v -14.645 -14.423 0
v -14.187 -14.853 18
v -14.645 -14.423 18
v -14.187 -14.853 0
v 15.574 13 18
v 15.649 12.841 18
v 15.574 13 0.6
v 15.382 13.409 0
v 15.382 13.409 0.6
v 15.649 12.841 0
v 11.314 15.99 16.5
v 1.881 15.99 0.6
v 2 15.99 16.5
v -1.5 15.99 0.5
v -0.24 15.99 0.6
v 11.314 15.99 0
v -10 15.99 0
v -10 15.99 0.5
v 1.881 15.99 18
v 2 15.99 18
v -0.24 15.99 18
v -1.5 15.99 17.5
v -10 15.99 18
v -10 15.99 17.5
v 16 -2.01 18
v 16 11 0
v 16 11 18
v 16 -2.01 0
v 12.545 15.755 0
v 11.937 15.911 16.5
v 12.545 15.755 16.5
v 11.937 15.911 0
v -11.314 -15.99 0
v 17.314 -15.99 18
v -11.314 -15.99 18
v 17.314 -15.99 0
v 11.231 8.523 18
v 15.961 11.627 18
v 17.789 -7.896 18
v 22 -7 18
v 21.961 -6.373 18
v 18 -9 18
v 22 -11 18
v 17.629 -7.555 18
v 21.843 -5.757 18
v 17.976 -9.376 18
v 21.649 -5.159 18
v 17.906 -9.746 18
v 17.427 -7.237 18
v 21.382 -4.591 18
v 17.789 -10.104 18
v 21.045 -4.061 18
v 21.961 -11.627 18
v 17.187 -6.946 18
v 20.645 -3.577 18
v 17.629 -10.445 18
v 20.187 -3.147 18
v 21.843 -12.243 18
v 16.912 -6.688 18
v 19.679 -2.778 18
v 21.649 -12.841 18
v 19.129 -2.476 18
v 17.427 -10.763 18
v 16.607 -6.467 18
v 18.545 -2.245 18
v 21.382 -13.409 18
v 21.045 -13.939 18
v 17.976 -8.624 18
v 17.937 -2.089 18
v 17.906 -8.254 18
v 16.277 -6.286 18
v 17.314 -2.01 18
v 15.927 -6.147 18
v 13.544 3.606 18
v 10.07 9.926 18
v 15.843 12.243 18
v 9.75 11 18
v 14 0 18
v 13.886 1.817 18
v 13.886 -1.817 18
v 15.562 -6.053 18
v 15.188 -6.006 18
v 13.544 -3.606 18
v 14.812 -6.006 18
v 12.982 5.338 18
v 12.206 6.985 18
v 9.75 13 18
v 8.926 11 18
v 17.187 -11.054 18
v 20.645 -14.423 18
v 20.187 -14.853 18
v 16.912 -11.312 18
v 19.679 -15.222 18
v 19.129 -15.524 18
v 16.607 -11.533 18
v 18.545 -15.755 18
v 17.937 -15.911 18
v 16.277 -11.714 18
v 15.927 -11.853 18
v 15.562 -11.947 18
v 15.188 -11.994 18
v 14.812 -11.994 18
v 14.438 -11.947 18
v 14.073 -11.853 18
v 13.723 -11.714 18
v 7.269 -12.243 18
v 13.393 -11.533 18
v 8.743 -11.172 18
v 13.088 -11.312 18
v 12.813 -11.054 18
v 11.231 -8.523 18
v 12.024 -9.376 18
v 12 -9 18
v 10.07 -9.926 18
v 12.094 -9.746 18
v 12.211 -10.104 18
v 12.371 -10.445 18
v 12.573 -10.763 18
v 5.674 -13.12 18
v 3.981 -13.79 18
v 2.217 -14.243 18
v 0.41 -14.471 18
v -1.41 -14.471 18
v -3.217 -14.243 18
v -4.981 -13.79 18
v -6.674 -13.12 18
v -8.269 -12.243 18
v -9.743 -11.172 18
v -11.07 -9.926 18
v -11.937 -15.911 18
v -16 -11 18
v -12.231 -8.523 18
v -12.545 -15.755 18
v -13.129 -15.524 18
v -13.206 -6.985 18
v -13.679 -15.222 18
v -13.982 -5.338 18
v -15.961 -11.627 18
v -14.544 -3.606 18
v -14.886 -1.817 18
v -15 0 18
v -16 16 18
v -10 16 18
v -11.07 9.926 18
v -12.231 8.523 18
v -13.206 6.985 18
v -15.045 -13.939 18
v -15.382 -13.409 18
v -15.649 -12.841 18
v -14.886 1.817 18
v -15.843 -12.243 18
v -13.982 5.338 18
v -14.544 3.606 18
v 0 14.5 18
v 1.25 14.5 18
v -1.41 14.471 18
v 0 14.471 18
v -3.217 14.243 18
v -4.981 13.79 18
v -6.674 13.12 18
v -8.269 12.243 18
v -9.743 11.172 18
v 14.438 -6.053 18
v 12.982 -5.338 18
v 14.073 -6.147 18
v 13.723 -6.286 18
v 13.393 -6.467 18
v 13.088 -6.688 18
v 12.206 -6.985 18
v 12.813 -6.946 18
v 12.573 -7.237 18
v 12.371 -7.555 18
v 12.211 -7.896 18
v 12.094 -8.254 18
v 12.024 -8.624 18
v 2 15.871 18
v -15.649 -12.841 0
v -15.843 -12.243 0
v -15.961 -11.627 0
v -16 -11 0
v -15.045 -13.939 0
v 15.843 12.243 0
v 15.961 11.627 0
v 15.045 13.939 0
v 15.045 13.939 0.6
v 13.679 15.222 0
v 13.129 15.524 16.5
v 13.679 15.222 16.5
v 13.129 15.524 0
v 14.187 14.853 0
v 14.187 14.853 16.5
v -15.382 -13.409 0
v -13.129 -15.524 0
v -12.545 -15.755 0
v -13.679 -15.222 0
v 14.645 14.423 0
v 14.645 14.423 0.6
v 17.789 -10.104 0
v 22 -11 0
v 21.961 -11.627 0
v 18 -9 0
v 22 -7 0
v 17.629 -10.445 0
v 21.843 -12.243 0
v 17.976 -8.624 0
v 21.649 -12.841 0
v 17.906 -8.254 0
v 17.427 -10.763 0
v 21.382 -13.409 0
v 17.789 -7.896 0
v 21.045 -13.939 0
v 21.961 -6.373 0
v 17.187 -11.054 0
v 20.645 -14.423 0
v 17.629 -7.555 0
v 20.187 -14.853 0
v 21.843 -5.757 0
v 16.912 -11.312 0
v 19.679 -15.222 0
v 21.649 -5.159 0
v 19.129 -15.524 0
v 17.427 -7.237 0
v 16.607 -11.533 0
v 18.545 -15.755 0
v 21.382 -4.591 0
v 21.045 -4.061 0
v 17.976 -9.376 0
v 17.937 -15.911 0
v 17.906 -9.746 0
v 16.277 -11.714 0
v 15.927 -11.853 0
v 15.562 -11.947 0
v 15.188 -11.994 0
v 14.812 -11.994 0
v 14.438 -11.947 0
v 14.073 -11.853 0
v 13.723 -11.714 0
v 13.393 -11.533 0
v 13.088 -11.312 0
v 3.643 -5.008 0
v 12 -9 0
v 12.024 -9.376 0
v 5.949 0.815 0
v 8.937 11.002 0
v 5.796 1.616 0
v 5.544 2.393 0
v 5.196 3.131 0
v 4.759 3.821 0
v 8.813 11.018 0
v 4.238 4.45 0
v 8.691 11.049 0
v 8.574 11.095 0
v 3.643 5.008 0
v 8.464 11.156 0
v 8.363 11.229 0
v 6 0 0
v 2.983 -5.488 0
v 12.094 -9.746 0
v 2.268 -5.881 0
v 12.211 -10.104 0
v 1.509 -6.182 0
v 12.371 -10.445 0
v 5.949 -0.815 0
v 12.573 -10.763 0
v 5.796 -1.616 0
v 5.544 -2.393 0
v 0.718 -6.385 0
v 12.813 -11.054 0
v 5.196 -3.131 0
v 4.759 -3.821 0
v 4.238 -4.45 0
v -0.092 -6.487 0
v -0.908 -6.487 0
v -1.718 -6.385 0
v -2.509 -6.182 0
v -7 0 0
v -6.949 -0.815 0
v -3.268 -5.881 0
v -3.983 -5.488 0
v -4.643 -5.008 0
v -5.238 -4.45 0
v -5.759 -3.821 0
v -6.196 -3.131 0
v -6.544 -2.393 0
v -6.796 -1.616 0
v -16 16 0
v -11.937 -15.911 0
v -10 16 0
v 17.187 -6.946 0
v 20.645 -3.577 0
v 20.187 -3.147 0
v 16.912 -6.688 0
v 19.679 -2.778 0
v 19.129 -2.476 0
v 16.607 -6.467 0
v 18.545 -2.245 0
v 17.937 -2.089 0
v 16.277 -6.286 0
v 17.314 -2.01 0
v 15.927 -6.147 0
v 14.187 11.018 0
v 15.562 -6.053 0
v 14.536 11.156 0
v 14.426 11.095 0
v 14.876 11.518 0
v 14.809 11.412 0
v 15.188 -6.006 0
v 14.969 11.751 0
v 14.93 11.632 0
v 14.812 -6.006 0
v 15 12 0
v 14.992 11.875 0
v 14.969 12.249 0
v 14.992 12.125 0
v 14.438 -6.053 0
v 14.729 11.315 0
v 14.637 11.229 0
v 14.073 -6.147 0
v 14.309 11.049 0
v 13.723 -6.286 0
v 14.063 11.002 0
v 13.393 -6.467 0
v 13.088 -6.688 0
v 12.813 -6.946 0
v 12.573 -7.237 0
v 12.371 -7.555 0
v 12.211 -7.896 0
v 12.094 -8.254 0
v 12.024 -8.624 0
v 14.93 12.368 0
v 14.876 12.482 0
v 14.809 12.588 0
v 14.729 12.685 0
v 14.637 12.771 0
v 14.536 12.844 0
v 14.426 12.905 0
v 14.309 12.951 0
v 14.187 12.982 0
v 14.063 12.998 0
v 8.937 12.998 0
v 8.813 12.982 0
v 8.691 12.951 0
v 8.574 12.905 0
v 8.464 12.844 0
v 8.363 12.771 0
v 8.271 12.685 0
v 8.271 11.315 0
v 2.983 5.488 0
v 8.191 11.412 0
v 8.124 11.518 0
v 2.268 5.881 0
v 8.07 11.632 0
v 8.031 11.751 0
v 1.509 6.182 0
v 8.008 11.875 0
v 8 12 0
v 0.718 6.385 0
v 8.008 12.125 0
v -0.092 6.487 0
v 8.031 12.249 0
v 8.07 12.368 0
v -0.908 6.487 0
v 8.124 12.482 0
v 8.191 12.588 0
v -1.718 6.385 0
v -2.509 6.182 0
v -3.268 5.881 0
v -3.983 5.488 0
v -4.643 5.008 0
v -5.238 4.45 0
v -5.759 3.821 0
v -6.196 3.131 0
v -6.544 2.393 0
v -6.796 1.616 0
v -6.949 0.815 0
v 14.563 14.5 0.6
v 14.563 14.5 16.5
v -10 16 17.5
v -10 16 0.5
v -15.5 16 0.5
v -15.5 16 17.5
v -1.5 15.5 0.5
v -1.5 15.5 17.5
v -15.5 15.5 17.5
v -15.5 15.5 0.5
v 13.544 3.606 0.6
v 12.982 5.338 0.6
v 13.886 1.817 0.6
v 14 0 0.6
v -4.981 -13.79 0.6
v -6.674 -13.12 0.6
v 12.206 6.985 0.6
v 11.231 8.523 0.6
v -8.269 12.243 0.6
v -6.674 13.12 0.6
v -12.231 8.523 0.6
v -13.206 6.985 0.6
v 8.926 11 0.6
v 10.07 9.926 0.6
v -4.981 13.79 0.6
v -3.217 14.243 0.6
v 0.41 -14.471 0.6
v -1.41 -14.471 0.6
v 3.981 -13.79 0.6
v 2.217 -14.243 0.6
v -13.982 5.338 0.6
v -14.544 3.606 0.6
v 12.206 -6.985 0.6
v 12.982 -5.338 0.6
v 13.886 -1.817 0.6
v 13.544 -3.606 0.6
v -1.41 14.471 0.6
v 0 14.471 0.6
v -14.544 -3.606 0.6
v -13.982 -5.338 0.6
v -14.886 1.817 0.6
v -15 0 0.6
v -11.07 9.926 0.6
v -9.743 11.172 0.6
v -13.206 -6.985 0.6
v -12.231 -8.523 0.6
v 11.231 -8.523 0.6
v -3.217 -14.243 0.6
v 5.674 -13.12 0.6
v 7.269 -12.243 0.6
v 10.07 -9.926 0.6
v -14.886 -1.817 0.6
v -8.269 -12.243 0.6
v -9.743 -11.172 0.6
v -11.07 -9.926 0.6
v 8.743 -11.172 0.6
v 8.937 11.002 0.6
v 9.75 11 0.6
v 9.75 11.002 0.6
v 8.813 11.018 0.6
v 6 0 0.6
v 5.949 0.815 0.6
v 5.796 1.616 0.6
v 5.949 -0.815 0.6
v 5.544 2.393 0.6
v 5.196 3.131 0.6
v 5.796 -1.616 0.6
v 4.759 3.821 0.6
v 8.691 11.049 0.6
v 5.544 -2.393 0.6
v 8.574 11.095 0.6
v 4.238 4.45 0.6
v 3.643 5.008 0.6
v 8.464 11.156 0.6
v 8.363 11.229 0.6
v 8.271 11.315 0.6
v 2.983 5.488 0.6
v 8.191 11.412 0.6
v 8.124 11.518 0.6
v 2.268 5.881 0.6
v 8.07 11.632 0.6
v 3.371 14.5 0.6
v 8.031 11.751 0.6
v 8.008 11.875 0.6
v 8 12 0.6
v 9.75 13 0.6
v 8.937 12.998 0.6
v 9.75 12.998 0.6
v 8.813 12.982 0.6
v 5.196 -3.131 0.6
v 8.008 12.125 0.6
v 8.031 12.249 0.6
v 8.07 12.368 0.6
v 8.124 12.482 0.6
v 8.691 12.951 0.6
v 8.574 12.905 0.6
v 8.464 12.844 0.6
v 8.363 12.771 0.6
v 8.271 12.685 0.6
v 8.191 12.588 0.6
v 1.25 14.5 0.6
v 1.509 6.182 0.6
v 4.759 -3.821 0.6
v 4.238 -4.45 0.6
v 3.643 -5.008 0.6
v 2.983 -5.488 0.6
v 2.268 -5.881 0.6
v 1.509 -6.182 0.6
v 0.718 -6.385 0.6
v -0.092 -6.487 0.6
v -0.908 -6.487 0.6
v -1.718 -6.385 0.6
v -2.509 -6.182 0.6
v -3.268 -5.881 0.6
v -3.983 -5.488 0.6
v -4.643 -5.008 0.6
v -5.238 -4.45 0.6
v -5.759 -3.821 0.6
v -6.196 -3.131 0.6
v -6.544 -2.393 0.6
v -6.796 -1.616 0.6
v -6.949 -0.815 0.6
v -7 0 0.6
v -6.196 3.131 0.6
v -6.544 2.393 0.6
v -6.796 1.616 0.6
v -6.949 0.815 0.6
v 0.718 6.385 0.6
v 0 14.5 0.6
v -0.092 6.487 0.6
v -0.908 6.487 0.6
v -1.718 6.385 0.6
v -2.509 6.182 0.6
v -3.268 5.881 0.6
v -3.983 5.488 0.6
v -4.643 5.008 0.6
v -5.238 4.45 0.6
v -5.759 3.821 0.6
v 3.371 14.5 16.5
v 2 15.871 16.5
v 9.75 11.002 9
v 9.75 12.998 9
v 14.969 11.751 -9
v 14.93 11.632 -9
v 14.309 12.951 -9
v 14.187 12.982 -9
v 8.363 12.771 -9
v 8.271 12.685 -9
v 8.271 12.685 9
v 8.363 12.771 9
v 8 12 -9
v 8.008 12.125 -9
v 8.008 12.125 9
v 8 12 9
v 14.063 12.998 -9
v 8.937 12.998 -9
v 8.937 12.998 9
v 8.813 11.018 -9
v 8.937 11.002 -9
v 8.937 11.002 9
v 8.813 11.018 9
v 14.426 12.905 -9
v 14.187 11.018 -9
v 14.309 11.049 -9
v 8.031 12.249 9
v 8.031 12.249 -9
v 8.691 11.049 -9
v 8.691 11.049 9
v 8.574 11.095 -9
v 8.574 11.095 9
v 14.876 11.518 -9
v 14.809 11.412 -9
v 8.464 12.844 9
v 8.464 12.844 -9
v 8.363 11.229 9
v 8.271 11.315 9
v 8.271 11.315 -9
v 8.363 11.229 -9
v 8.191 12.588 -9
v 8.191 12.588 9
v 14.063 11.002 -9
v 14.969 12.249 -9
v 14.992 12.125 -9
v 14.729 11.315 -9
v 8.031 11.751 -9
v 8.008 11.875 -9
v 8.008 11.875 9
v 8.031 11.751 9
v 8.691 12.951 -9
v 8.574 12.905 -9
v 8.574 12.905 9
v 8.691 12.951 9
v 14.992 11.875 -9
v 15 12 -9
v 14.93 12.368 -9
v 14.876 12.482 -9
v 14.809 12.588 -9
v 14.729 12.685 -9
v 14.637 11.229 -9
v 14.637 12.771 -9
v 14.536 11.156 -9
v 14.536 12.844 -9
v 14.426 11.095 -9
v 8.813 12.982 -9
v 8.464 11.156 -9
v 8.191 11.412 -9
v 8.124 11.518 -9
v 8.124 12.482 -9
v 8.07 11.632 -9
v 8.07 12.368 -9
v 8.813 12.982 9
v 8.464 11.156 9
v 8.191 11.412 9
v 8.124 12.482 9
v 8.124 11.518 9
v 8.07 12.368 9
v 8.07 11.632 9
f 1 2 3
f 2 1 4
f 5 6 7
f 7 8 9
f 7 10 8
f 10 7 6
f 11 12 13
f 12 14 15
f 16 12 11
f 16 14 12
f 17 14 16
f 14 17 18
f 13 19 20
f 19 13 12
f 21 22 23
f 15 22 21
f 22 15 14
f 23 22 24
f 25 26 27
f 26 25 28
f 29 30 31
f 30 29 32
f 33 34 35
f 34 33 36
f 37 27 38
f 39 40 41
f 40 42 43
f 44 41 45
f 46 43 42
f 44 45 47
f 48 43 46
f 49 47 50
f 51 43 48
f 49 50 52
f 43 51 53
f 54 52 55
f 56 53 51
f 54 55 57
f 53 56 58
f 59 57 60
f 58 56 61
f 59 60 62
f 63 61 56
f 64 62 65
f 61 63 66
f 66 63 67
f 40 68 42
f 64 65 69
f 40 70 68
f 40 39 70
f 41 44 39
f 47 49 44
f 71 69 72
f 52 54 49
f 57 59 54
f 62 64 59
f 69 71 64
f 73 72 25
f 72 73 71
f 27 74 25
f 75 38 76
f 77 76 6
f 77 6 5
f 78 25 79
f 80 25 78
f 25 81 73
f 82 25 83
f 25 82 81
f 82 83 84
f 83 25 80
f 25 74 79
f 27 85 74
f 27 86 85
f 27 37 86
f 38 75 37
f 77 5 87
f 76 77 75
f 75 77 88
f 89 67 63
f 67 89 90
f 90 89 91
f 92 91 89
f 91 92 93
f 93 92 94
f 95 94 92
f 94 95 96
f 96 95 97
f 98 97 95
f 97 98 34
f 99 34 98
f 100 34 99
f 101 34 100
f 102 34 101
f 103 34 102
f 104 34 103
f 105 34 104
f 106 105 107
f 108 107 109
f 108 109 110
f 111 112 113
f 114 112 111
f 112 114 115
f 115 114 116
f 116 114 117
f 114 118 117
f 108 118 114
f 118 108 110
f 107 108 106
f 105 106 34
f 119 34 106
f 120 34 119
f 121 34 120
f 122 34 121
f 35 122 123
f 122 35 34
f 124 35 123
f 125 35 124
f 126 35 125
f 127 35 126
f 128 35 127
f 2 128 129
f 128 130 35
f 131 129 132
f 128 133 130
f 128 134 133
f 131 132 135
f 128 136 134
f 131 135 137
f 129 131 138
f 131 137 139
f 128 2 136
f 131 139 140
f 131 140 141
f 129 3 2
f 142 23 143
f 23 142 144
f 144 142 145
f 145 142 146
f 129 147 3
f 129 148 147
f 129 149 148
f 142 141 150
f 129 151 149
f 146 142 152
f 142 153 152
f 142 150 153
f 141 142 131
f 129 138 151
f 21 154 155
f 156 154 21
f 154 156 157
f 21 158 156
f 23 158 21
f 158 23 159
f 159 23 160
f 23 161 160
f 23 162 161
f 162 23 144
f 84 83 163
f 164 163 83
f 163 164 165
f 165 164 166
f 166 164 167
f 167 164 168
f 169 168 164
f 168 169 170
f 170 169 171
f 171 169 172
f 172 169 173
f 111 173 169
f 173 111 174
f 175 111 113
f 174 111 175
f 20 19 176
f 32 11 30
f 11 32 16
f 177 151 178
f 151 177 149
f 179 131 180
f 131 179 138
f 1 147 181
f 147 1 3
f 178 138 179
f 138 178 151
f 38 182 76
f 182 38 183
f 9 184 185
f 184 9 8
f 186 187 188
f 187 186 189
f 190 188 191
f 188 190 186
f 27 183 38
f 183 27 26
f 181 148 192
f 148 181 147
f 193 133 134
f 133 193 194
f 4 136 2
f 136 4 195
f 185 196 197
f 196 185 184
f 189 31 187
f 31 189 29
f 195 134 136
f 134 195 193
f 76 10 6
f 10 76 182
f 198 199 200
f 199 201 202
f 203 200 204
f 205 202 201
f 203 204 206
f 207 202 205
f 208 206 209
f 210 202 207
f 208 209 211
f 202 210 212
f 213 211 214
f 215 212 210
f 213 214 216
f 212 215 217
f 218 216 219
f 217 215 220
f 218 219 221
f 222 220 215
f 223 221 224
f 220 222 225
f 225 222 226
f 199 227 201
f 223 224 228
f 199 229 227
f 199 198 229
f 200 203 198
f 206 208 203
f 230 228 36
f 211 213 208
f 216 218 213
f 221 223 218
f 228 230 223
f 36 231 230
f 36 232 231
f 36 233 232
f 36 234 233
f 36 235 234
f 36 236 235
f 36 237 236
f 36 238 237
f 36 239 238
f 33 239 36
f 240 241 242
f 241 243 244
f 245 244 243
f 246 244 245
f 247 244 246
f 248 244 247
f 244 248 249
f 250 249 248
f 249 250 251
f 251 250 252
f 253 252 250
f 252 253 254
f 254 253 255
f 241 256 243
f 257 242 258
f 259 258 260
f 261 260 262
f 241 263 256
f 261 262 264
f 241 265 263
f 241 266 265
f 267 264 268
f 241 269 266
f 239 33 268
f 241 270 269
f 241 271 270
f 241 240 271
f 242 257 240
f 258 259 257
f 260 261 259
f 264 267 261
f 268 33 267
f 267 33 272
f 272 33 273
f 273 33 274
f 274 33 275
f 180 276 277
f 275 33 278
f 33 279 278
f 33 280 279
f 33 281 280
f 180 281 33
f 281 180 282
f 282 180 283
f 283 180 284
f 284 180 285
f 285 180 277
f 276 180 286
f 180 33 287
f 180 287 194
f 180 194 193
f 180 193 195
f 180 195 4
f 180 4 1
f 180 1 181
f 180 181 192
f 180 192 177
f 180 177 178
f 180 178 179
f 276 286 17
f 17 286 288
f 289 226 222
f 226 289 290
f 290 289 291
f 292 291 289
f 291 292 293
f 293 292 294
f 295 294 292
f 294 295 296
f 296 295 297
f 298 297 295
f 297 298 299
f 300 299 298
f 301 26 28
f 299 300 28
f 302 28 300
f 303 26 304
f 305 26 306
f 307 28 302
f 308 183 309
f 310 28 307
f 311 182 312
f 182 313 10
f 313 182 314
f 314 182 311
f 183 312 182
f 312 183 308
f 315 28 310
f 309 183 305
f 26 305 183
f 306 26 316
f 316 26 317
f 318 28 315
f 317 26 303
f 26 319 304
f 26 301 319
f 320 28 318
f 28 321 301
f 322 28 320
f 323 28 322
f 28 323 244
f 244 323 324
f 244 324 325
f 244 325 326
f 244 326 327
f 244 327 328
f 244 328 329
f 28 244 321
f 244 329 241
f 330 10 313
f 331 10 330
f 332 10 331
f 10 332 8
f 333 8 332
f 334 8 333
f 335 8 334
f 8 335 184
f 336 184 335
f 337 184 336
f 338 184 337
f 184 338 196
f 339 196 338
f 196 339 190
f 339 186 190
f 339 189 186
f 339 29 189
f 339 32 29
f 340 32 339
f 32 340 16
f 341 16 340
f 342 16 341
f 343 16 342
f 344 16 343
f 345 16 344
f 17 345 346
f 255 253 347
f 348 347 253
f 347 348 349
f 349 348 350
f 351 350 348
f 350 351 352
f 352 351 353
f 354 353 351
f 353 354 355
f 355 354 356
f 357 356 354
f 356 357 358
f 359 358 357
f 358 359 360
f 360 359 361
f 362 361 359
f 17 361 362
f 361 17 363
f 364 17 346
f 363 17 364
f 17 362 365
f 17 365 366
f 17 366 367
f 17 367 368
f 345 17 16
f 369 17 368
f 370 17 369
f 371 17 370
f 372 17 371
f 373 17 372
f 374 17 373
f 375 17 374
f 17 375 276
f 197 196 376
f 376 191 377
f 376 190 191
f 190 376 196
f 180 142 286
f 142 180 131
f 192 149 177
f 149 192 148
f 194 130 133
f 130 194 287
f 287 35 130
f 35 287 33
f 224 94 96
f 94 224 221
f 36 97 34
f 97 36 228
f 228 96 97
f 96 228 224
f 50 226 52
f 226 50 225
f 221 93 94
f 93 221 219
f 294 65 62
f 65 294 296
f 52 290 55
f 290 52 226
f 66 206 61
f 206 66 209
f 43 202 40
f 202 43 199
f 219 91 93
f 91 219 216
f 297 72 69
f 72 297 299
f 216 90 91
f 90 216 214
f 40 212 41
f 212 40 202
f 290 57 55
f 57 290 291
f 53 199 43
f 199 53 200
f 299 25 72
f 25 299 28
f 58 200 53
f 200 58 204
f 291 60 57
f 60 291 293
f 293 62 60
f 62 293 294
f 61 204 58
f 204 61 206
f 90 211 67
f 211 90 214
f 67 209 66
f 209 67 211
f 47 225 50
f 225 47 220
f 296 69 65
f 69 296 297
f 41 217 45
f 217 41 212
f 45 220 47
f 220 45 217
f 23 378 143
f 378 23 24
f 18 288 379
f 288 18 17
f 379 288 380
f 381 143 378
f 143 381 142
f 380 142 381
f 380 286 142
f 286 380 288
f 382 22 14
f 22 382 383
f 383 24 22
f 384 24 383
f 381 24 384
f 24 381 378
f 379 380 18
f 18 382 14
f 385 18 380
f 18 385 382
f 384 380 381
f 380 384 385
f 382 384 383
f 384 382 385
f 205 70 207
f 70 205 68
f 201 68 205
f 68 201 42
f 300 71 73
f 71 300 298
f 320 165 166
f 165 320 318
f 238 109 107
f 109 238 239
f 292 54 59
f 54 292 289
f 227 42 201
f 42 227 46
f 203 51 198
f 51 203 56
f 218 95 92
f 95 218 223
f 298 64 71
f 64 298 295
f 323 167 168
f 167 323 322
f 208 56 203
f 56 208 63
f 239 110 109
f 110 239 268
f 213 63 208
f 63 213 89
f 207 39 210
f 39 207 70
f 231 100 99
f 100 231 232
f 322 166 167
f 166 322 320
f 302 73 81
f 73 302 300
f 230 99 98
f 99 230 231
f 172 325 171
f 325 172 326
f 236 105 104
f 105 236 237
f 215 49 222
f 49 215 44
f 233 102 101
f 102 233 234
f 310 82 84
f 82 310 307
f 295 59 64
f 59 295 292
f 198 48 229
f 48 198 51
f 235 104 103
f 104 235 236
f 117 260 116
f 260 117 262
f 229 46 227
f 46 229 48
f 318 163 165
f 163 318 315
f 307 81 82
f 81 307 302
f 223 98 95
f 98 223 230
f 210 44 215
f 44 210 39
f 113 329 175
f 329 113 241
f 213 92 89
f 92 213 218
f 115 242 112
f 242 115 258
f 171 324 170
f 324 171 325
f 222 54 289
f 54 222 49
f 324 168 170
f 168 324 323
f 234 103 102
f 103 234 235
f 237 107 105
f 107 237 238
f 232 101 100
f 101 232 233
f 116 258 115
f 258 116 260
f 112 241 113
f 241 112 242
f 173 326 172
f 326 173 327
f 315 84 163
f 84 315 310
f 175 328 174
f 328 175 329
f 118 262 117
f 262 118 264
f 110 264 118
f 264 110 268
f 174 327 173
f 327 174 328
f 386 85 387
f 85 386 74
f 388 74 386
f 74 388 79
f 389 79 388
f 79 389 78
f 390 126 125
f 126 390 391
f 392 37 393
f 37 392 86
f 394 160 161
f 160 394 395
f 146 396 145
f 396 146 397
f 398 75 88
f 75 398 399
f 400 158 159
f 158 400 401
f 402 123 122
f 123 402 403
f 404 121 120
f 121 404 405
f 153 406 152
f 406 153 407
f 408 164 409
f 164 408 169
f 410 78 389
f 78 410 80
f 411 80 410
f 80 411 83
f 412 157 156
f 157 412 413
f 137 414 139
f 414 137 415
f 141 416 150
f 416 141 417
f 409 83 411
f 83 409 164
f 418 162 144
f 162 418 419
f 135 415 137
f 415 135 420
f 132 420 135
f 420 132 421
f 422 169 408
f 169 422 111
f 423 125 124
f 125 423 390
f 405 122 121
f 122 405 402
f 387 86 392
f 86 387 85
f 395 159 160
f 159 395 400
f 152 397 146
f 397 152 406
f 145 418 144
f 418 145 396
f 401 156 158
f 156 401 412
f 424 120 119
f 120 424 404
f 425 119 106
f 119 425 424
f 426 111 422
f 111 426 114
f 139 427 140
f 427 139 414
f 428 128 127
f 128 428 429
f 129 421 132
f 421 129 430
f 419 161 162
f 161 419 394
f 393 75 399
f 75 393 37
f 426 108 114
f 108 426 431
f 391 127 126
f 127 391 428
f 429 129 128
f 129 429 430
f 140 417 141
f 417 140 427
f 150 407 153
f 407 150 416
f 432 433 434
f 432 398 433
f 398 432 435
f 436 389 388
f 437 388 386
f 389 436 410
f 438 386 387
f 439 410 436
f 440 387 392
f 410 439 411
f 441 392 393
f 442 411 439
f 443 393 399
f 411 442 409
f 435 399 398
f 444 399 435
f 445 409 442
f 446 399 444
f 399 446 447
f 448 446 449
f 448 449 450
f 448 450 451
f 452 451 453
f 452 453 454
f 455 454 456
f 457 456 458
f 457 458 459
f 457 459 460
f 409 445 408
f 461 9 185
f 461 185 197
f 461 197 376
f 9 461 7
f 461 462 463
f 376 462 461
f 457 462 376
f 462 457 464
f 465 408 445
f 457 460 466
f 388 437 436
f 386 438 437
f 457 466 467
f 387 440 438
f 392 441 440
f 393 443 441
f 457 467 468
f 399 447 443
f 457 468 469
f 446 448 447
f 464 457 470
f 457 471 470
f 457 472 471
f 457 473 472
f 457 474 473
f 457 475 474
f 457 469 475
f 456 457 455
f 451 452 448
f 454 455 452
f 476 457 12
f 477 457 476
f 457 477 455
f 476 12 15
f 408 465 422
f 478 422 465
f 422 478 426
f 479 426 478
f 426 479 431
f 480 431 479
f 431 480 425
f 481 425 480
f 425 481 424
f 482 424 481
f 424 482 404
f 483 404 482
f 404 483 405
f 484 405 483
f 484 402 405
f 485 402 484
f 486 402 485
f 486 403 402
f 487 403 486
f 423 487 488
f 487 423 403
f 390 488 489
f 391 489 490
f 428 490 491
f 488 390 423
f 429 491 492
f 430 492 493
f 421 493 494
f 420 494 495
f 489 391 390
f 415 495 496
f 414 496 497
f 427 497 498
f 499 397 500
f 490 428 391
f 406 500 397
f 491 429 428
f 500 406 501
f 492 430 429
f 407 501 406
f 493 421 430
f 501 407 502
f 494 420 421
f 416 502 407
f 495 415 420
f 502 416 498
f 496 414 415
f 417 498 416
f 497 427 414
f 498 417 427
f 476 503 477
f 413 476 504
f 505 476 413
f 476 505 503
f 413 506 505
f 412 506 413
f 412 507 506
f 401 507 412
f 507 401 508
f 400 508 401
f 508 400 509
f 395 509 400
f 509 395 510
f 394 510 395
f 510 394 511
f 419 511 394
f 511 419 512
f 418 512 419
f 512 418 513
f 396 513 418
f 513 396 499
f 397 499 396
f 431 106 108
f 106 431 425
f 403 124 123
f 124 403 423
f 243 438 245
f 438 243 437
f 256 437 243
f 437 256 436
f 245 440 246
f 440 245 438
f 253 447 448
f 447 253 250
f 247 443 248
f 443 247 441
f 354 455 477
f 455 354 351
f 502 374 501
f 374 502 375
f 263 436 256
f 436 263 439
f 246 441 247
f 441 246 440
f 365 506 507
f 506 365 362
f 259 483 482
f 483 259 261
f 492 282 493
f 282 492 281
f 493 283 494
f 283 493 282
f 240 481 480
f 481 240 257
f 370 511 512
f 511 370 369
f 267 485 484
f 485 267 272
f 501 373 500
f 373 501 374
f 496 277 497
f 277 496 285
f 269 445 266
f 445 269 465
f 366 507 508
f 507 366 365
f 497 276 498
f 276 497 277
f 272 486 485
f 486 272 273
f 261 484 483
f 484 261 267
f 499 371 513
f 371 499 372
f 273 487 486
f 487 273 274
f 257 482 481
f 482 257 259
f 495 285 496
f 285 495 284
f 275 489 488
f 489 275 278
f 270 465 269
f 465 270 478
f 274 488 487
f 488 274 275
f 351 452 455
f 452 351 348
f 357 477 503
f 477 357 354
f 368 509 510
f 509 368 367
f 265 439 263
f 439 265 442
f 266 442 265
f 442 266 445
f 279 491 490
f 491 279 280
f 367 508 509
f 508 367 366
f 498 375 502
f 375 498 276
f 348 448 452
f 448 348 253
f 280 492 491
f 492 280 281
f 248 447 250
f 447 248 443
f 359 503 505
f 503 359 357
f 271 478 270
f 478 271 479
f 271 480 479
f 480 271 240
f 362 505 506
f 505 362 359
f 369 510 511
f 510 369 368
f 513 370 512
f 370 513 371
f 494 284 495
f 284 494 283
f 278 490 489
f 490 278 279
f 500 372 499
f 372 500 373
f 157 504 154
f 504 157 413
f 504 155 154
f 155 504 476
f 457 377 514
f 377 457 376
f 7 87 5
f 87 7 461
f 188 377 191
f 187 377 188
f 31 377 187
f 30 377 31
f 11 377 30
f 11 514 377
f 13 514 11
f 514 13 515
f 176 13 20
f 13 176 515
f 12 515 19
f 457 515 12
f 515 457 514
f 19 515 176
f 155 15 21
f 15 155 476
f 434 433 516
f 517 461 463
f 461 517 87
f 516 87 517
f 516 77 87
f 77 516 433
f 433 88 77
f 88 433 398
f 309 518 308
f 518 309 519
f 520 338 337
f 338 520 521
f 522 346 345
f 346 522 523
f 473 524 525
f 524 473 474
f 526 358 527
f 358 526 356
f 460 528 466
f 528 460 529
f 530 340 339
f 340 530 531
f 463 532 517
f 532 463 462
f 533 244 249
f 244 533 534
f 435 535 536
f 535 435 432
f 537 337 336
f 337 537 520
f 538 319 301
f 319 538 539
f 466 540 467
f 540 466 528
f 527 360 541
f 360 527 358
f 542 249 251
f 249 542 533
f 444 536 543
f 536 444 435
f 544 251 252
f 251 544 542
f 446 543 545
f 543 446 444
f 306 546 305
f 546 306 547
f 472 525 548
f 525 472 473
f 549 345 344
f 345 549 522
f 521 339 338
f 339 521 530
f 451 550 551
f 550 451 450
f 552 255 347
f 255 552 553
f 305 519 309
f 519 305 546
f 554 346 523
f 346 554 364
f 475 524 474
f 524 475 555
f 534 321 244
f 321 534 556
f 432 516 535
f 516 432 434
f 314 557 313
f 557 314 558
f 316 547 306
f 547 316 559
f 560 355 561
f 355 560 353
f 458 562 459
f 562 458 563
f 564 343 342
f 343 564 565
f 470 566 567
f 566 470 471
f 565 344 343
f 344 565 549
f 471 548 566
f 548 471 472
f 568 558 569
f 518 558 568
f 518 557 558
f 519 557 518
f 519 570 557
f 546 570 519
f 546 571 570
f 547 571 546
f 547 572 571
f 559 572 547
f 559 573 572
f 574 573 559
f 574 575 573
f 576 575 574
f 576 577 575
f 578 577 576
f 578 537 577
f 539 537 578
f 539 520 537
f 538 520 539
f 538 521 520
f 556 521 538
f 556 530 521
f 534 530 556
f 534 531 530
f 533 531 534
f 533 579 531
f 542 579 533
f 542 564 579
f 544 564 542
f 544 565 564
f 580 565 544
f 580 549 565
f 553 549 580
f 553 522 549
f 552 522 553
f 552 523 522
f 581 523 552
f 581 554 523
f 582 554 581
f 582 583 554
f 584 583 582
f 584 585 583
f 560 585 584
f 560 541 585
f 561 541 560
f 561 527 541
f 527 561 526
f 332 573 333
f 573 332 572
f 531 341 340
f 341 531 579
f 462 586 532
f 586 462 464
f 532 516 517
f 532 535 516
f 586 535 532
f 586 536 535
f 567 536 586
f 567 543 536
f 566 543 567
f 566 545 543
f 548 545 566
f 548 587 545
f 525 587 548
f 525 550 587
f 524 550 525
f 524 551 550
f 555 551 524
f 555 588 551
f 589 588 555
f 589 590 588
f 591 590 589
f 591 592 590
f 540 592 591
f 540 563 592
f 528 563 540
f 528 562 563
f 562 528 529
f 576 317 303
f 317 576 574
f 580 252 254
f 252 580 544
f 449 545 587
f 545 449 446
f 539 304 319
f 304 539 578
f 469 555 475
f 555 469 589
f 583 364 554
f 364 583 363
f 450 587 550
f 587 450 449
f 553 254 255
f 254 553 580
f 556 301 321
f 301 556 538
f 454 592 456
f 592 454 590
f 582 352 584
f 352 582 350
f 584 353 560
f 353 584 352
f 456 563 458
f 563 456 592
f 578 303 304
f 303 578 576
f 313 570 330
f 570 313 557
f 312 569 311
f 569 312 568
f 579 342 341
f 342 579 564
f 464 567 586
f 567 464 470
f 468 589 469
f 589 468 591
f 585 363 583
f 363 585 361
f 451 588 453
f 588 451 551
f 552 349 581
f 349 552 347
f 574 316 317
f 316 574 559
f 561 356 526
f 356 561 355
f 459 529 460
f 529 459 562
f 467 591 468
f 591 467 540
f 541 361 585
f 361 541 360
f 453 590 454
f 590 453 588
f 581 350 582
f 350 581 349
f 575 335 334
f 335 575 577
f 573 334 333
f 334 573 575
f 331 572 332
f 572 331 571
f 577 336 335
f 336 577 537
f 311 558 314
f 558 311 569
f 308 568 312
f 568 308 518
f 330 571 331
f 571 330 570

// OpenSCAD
$fn = 50;


union() {
	difference() {
		union() {
			hull() {
				translate(v = [-11.0000000000, 11.0000000000, 0]) {
					cylinder(h = 18, r = 5);
				}
				translate(v = [11.0000000000, 11.0000000000, 0]) {
					cylinder(h = 18, r = 5);
				}
				translate(v = [-11.0000000000, -11.0000000000, 0]) {
					cylinder(h = 18, r = 5);
				}
				translate(v = [11.0000000000, -11.0000000000, 0]) {
					cylinder(h = 18, r = 5);
				}
			}
			translate(v = [7.5000000000, -9.0000000000, 0]) {
				hull() {
					translate(v = [-9.5000000000, 2.0000000000, 0]) {
						cylinder(h = 18, r = 5);
					}
					translate(v = [9.5000000000, 2.0000000000, 0]) {
						cylinder(h = 18, r = 5);
					}
					translate(v = [-9.5000000000, -2.0000000000, 0]) {
						cylinder(h = 18, r = 5);
					}
					translate(v = [9.5000000000, -2.0000000000, 0]) {
						cylinder(h = 18, r = 5);
					}
				}
			}
			translate(v = [-16.0000000000, 10.0000000000, 0]) {
				cube(size = [6, 6, 18]);
			}
		}
		union() {
			translate(v = [-15.5000000000, 15.5000000000, 0.5000000000]) {
				cube(size = [14, 0.5000000000, 17.0000000000]);
			}
			translate(v = [15.0000000000, -9.0000000000, -100.0000000000]) {
				cylinder(h = 200, r = 3.0000000000);
			}
			translate(v = [-0.5000000000, 0.0000000000, 0.6000000000]) {
				cylinder(h = 20.4000000000, r = 14.5000000000);
			}
			translate(v = [-0.5000000000, 0.0000000000, -9.0000000000]) {
				cylinder(h = 18, r = 6.5000000000);
			}
			translate(v = [0.0000000000, 13.0000000000, 0.6000000000]) {
				cube(size = [16.0000000000, 1.5000000000, 20.4000000000]);
			}
			translate(v = [2.0000000000, 13.0000000000, 16.5000000000]) {
				cube(size = [14.0000000000, 4.5000000000, 1.5000000000]);
			}
			translate(v = [-3.0000000000, 18.7500000000, 0.6000000000]) {
				rotate(a = [0, 0, -45]) {
					cube(size = [10, 1.5000000000, 20.4000000000]);
				}
			}
			translate(v = [2.2500000000, 11.0000000000, 0.6000000000]) {
				cube(size = [7.5000000000, 2, 17.4000000000]);
			}
		}
	}
	union() {
		translate(v = [11.5000000000, 12, -9.0000000000]) {
			rotate(a = [0, 0, 0]) {
				difference() {
					union() {
						hull() {
							translate(v = [2.5000000000, 0, 0]) {
								cylinder(h = 18, r = 1.0000000000, r1 = 1.0000000000, r2 = 1.0000000000);
							}
							translate(v = [-2.5000000000, 0, 0]) {
								cylinder(h = 18, r = 1.0000000000, r1 = 1.0000000000, r2 = 1.0000000000);
							}
						}
					}
					union();
				}
			}
		}
	}
}
